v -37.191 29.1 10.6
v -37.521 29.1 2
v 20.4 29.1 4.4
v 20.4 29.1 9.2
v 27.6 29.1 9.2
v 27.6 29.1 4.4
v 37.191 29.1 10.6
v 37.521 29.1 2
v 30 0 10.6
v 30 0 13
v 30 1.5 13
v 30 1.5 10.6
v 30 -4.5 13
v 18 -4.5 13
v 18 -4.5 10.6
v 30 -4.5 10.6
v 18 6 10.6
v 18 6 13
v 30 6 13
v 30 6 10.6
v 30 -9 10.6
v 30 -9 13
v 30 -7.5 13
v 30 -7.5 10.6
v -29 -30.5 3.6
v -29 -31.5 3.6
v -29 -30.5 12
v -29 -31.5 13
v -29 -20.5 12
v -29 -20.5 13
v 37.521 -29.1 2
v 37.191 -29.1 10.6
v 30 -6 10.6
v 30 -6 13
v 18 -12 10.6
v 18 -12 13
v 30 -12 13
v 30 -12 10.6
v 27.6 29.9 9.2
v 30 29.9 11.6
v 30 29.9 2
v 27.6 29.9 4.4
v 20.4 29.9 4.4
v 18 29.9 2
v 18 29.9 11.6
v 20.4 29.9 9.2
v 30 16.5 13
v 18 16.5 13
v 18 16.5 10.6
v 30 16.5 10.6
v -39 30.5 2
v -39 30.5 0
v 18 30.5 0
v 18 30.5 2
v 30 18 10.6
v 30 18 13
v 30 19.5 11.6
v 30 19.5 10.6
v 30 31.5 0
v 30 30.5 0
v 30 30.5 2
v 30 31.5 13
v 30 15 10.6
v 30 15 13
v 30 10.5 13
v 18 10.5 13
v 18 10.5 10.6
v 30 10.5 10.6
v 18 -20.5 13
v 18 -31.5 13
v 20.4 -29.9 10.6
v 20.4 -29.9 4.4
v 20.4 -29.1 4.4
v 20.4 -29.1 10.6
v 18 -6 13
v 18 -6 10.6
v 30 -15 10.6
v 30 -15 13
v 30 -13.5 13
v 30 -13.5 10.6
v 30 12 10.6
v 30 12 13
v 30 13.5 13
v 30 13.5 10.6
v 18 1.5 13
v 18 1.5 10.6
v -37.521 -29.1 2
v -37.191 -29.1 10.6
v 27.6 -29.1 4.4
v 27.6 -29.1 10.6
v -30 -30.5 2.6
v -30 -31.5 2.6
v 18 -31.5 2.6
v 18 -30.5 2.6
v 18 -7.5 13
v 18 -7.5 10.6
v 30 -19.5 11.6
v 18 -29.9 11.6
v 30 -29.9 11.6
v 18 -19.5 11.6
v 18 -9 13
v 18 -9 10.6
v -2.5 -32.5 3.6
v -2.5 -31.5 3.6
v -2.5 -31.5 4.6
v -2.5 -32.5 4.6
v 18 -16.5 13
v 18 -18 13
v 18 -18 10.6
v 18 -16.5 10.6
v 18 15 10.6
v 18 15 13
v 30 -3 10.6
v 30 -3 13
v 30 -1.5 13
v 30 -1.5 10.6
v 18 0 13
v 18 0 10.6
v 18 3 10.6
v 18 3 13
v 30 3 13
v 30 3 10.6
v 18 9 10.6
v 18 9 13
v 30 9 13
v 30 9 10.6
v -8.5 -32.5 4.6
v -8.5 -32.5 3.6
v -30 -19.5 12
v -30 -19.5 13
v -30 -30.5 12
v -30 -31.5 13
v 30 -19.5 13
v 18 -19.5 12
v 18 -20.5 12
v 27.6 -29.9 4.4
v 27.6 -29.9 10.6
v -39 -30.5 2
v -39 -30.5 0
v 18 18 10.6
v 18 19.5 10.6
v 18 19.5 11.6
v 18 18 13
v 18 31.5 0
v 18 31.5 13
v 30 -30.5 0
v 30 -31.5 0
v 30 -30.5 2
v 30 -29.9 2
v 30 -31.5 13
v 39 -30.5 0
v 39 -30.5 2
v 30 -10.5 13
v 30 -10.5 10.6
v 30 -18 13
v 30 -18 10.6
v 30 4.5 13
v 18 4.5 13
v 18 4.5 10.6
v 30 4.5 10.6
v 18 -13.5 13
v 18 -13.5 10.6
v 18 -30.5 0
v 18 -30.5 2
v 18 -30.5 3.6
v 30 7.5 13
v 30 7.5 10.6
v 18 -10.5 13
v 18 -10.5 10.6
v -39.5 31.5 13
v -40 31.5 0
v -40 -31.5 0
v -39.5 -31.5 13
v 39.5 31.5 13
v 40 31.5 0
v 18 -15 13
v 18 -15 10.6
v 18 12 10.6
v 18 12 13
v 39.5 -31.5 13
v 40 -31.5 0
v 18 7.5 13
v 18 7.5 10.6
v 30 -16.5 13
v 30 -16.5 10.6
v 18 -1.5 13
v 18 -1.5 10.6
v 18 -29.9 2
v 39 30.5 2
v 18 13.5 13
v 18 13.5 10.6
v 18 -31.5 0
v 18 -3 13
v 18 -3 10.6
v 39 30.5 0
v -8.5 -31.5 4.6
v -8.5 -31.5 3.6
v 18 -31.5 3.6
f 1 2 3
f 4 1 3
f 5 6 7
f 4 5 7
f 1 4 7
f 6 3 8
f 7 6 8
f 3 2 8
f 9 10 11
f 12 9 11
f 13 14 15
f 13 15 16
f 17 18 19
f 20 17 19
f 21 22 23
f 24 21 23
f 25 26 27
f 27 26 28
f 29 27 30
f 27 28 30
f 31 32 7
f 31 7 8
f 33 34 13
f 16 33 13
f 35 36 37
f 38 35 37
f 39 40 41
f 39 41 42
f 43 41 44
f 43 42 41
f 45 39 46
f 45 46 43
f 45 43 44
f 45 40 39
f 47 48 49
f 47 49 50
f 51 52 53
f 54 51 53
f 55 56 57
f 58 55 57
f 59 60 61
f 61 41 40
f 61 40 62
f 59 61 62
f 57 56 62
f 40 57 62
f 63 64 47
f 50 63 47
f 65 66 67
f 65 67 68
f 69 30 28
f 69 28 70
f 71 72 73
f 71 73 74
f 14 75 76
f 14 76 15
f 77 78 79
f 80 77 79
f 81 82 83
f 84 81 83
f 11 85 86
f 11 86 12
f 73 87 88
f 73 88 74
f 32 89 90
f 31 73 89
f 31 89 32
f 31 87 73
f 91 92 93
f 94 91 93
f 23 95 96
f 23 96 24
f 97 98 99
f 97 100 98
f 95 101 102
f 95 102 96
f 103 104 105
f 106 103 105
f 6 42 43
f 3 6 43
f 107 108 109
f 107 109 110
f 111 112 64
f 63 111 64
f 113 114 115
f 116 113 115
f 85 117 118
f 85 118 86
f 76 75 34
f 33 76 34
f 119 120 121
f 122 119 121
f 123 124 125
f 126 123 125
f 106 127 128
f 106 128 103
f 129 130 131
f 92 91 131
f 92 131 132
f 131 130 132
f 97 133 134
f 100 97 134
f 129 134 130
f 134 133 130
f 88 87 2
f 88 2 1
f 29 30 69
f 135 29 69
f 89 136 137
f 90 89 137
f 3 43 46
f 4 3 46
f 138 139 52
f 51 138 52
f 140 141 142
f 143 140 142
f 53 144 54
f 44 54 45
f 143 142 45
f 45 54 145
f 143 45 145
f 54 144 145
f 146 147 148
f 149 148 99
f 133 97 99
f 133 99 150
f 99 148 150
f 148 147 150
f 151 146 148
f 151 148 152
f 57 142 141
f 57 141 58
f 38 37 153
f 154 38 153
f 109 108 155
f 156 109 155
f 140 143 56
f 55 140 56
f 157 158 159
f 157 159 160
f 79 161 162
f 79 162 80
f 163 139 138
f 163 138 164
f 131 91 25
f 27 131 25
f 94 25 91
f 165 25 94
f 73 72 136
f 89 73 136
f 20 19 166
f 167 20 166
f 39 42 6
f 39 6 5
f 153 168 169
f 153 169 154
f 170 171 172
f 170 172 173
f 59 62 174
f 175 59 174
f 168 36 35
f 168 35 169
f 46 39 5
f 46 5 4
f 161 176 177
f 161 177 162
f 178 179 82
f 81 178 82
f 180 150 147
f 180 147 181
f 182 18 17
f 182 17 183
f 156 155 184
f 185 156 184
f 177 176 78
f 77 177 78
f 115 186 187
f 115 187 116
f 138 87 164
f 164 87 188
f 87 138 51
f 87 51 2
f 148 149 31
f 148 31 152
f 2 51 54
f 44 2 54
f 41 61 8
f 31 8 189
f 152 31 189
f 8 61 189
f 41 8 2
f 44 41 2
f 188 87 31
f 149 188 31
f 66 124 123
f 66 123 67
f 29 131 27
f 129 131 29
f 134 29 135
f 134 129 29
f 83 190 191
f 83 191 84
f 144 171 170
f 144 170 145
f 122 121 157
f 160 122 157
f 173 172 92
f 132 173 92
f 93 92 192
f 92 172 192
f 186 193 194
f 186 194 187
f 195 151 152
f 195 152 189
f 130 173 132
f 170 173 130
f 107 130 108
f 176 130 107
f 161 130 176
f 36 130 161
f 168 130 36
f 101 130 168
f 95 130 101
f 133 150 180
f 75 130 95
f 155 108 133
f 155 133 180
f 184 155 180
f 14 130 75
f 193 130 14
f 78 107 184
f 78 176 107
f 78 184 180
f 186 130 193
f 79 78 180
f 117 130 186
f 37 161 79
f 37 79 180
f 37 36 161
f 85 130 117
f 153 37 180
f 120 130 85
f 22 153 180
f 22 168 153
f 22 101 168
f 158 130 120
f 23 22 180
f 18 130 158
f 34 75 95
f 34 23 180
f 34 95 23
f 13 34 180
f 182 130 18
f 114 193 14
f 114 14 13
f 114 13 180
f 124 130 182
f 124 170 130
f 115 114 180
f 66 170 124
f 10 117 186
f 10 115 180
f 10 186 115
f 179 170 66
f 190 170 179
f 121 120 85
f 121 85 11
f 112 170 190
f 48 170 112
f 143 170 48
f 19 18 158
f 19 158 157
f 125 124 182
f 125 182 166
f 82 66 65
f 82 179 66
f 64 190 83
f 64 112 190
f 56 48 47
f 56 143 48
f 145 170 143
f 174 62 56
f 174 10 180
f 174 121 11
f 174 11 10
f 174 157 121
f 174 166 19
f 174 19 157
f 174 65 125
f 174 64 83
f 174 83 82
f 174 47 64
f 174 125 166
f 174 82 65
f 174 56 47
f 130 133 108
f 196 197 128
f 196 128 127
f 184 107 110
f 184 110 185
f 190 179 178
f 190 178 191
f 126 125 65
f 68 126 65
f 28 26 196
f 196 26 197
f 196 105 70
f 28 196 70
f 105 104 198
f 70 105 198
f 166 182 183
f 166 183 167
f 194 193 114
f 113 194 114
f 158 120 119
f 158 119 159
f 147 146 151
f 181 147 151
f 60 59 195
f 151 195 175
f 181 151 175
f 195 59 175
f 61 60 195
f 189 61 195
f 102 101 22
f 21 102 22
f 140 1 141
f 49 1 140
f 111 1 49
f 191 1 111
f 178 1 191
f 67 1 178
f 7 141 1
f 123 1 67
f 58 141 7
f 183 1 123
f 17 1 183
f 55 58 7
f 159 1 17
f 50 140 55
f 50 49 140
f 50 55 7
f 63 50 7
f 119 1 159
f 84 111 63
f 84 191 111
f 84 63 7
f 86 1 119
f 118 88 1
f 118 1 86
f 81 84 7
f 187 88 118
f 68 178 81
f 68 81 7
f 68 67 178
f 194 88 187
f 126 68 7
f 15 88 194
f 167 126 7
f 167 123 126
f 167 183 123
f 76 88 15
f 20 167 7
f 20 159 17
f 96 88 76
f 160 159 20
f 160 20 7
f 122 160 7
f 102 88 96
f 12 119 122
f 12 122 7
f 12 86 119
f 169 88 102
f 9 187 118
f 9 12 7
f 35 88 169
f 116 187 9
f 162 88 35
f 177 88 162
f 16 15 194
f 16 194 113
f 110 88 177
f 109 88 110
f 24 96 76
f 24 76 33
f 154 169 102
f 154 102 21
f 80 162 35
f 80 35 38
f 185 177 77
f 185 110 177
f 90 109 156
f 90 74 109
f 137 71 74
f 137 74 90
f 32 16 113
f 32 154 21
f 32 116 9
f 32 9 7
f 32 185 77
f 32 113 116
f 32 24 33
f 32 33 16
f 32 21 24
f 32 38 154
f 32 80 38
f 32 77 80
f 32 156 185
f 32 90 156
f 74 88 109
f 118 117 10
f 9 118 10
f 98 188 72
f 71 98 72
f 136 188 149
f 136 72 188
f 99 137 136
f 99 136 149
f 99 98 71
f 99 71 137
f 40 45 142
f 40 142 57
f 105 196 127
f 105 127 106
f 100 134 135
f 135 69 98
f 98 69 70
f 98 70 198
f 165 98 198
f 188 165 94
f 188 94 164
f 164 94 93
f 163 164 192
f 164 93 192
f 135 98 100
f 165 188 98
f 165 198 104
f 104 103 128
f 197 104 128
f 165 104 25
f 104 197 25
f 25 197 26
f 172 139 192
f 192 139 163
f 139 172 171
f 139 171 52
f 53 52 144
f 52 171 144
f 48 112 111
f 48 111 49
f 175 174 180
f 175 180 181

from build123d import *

# Parameters (mm, degrees)
F0_W      = 80
F0_H      = 63
F0_W_2    = 78
F0_H_2    = 61
F1_DEPTH  = 13
F3_DEPTH  = 63
F4_T      = -2.4
F5_DEPTH  = 2
F6_DEPTH  = 1.6
F7_W      = 7.2
F7_H      = 6.2
F8_DEPTH  = 2
F9_W      = 12
F9_H      = 12
F10_DEPTH = 1.4
F9_H_2    = 1.5
F11_DEPTH = 3
F12_W     = 12
F12_H     = 11.6
F13_DEPTH = 1.6
F14_W     = 7.2
F14_H     = 4.8
F15_DEPTH = 3
F16_DEPTH = 1
F2_W      = 6
F2_H      = 1
F17_DEPTH = 1
F18_DEPTH = 1


with BuildPart() as f1:
    # F0 (on Top) → F1 (new body)
    with BuildSketch(Plane.XY):
        Rectangle(F0_W, F0_H)
        Rectangle(F0_W_2, F0_H_2, mode=Mode.SUBTRACT)
        Rectangle(F0_W_2, F0_H_2)
    extrude(amount=F1_DEPTH)

    # F2 (on face) → F3 (cut)
    with BuildSketch(Plane.XZ.offset(31.5)):
        Polygon((-39.5, 13), (-40, 13), (-40, 0), align=None)
        Polygon((39.5, 13), (40, 0), (40, 13), align=None)
    extrude(amount=-F3_DEPTH, mode=Mode.SUBTRACT)

    # F4
    f4_openings = [f1.faces().sort_by_distance(p)[0] for p in [
        (0, 0, 0),
    ]]
    offset(amount=F4_T, openings=f4_openings)

    # F0 (on Top) → F5 (cut)
    with BuildSketch(Plane.XY):
        Rectangle(F0_W_2, F0_H_2)
    extrude(amount=F5_DEPTH, mode=Mode.SUBTRACT)

    # F2 (on face) → F6 (cut)
    with BuildSketch(Plane.XZ.offset(31.5)):
        Polygon((18, 2.6), (18, 0), (30, 0), (30, 13), (18, 13), (18, 3.6), align=None)
    extrude(amount=-F6_DEPTH, mode=Mode.SUBTRACT)

    # F7 (on face) → F8 (cut)
    with BuildSketch(Plane.XZ.offset(29.9)):
        with Locations((24, 7.5)):
            Rectangle(F7_W, F7_H)
    extrude(amount=-F8_DEPTH, mode=Mode.SUBTRACT)

    # F9 (on face) → F10 (cut)
    with BuildSketch(Plane.XY.offset(13)):
        with Locations((24, 25.5)):
            Rectangle(F9_W, F9_H)
        Polygon((18, -20.5), (18, -29.9), (30, -29.9), (30, -19.5), (18, -19.5), align=None)
    extrude(amount=-F10_DEPTH, mode=Mode.SUBTRACT)

    # F9 (on face) → F11 (cut)
    with BuildSketch(Plane.XY.offset(13)):
        with Locations((24, -17.25)):
            Rectangle(F9_W, F9_H_2)
        with Locations((24, -14.25)):
            Rectangle(F9_W, F9_H_2)
        with Locations((24, -11.25)):
            Rectangle(F9_W, F9_H_2)
        with Locations((24, -8.25)):
            Rectangle(F9_W, F9_H_2)
        with Locations((24, -5.25)):
            Rectangle(F9_W, F9_H_2)
        with Locations((24, 0.75)):
            Rectangle(F9_W, F9_H_2)
        with Locations((24, -2.25)):
            Rectangle(F9_W, F9_H_2)
        with Locations((24, 3.75)):
            Rectangle(F9_W, F9_H_2)
        with Locations((24, 6.75)):
            Rectangle(F9_W, F9_H_2)
        with Locations((24, 9.75)):
            Rectangle(F9_W, F9_H_2)
        with Locations((24, 12.75)):
            Rectangle(F9_W, F9_H_2)
        with Locations((24, 15.75)):
            Rectangle(F9_W, F9_H_2)
        with Locations((24, 18.75)):
            Rectangle(F9_W, F9_H_2)
    extrude(amount=-F11_DEPTH, mode=Mode.SUBTRACT)

    # F12 (on face) → F13 (cut)
    with BuildSketch(Plane(origin=(0, 31.5, 0), x_dir=(-1, 0, 0), z_dir=(0, 1, 0))):
        with Locations((-24, 5.8)):
            Rectangle(F12_W, F12_H)
    extrude(amount=-F13_DEPTH, mode=Mode.SUBTRACT)

    # F14 (on face) → F15 (cut)
    with BuildSketch(Plane(origin=(0, 29.9, 0), x_dir=(-1, 0, 0), z_dir=(0, 1, 0))):
        with Locations((-24, 6.8)):
            Rectangle(F14_W, F14_H)
    extrude(amount=-F15_DEPTH, mode=Mode.SUBTRACT)

    # F9 (on face) → F16 (cut)
    with BuildSketch(Plane.XY.offset(13)):
        Polygon((-29, -20.5), (18, -20.5), (18, -19.5), (-30, -19.5), (-30, -31.5), (-29, -31.5), align=None)
    extrude(amount=-F16_DEPTH, mode=Mode.SUBTRACT)

    # F2 (on face) → F17 (join)
    with BuildSketch(Plane.XZ.offset(31.5)):
        with Locations((-5.5, 4.1)):
            Rectangle(F2_W, F2_H)
    extrude(amount=F17_DEPTH)

    # F2 (on face) → F18 (cut)
    with BuildSketch(Plane.XZ.offset(31.5)):
        Polygon((-29, 13), (-30, 13), (-30, 2.6), (-29, 2.6), (-29, 3.6), align=None)
        Polygon((-29, 2.6), (18, 2.6), (18, 3.6), (-2.5, 3.6), (-8.5, 3.6), (-29, 3.6), align=None)
    extrude(amount=-F18_DEPTH, mode=Mode.SUBTRACT)


solid = f1.part
